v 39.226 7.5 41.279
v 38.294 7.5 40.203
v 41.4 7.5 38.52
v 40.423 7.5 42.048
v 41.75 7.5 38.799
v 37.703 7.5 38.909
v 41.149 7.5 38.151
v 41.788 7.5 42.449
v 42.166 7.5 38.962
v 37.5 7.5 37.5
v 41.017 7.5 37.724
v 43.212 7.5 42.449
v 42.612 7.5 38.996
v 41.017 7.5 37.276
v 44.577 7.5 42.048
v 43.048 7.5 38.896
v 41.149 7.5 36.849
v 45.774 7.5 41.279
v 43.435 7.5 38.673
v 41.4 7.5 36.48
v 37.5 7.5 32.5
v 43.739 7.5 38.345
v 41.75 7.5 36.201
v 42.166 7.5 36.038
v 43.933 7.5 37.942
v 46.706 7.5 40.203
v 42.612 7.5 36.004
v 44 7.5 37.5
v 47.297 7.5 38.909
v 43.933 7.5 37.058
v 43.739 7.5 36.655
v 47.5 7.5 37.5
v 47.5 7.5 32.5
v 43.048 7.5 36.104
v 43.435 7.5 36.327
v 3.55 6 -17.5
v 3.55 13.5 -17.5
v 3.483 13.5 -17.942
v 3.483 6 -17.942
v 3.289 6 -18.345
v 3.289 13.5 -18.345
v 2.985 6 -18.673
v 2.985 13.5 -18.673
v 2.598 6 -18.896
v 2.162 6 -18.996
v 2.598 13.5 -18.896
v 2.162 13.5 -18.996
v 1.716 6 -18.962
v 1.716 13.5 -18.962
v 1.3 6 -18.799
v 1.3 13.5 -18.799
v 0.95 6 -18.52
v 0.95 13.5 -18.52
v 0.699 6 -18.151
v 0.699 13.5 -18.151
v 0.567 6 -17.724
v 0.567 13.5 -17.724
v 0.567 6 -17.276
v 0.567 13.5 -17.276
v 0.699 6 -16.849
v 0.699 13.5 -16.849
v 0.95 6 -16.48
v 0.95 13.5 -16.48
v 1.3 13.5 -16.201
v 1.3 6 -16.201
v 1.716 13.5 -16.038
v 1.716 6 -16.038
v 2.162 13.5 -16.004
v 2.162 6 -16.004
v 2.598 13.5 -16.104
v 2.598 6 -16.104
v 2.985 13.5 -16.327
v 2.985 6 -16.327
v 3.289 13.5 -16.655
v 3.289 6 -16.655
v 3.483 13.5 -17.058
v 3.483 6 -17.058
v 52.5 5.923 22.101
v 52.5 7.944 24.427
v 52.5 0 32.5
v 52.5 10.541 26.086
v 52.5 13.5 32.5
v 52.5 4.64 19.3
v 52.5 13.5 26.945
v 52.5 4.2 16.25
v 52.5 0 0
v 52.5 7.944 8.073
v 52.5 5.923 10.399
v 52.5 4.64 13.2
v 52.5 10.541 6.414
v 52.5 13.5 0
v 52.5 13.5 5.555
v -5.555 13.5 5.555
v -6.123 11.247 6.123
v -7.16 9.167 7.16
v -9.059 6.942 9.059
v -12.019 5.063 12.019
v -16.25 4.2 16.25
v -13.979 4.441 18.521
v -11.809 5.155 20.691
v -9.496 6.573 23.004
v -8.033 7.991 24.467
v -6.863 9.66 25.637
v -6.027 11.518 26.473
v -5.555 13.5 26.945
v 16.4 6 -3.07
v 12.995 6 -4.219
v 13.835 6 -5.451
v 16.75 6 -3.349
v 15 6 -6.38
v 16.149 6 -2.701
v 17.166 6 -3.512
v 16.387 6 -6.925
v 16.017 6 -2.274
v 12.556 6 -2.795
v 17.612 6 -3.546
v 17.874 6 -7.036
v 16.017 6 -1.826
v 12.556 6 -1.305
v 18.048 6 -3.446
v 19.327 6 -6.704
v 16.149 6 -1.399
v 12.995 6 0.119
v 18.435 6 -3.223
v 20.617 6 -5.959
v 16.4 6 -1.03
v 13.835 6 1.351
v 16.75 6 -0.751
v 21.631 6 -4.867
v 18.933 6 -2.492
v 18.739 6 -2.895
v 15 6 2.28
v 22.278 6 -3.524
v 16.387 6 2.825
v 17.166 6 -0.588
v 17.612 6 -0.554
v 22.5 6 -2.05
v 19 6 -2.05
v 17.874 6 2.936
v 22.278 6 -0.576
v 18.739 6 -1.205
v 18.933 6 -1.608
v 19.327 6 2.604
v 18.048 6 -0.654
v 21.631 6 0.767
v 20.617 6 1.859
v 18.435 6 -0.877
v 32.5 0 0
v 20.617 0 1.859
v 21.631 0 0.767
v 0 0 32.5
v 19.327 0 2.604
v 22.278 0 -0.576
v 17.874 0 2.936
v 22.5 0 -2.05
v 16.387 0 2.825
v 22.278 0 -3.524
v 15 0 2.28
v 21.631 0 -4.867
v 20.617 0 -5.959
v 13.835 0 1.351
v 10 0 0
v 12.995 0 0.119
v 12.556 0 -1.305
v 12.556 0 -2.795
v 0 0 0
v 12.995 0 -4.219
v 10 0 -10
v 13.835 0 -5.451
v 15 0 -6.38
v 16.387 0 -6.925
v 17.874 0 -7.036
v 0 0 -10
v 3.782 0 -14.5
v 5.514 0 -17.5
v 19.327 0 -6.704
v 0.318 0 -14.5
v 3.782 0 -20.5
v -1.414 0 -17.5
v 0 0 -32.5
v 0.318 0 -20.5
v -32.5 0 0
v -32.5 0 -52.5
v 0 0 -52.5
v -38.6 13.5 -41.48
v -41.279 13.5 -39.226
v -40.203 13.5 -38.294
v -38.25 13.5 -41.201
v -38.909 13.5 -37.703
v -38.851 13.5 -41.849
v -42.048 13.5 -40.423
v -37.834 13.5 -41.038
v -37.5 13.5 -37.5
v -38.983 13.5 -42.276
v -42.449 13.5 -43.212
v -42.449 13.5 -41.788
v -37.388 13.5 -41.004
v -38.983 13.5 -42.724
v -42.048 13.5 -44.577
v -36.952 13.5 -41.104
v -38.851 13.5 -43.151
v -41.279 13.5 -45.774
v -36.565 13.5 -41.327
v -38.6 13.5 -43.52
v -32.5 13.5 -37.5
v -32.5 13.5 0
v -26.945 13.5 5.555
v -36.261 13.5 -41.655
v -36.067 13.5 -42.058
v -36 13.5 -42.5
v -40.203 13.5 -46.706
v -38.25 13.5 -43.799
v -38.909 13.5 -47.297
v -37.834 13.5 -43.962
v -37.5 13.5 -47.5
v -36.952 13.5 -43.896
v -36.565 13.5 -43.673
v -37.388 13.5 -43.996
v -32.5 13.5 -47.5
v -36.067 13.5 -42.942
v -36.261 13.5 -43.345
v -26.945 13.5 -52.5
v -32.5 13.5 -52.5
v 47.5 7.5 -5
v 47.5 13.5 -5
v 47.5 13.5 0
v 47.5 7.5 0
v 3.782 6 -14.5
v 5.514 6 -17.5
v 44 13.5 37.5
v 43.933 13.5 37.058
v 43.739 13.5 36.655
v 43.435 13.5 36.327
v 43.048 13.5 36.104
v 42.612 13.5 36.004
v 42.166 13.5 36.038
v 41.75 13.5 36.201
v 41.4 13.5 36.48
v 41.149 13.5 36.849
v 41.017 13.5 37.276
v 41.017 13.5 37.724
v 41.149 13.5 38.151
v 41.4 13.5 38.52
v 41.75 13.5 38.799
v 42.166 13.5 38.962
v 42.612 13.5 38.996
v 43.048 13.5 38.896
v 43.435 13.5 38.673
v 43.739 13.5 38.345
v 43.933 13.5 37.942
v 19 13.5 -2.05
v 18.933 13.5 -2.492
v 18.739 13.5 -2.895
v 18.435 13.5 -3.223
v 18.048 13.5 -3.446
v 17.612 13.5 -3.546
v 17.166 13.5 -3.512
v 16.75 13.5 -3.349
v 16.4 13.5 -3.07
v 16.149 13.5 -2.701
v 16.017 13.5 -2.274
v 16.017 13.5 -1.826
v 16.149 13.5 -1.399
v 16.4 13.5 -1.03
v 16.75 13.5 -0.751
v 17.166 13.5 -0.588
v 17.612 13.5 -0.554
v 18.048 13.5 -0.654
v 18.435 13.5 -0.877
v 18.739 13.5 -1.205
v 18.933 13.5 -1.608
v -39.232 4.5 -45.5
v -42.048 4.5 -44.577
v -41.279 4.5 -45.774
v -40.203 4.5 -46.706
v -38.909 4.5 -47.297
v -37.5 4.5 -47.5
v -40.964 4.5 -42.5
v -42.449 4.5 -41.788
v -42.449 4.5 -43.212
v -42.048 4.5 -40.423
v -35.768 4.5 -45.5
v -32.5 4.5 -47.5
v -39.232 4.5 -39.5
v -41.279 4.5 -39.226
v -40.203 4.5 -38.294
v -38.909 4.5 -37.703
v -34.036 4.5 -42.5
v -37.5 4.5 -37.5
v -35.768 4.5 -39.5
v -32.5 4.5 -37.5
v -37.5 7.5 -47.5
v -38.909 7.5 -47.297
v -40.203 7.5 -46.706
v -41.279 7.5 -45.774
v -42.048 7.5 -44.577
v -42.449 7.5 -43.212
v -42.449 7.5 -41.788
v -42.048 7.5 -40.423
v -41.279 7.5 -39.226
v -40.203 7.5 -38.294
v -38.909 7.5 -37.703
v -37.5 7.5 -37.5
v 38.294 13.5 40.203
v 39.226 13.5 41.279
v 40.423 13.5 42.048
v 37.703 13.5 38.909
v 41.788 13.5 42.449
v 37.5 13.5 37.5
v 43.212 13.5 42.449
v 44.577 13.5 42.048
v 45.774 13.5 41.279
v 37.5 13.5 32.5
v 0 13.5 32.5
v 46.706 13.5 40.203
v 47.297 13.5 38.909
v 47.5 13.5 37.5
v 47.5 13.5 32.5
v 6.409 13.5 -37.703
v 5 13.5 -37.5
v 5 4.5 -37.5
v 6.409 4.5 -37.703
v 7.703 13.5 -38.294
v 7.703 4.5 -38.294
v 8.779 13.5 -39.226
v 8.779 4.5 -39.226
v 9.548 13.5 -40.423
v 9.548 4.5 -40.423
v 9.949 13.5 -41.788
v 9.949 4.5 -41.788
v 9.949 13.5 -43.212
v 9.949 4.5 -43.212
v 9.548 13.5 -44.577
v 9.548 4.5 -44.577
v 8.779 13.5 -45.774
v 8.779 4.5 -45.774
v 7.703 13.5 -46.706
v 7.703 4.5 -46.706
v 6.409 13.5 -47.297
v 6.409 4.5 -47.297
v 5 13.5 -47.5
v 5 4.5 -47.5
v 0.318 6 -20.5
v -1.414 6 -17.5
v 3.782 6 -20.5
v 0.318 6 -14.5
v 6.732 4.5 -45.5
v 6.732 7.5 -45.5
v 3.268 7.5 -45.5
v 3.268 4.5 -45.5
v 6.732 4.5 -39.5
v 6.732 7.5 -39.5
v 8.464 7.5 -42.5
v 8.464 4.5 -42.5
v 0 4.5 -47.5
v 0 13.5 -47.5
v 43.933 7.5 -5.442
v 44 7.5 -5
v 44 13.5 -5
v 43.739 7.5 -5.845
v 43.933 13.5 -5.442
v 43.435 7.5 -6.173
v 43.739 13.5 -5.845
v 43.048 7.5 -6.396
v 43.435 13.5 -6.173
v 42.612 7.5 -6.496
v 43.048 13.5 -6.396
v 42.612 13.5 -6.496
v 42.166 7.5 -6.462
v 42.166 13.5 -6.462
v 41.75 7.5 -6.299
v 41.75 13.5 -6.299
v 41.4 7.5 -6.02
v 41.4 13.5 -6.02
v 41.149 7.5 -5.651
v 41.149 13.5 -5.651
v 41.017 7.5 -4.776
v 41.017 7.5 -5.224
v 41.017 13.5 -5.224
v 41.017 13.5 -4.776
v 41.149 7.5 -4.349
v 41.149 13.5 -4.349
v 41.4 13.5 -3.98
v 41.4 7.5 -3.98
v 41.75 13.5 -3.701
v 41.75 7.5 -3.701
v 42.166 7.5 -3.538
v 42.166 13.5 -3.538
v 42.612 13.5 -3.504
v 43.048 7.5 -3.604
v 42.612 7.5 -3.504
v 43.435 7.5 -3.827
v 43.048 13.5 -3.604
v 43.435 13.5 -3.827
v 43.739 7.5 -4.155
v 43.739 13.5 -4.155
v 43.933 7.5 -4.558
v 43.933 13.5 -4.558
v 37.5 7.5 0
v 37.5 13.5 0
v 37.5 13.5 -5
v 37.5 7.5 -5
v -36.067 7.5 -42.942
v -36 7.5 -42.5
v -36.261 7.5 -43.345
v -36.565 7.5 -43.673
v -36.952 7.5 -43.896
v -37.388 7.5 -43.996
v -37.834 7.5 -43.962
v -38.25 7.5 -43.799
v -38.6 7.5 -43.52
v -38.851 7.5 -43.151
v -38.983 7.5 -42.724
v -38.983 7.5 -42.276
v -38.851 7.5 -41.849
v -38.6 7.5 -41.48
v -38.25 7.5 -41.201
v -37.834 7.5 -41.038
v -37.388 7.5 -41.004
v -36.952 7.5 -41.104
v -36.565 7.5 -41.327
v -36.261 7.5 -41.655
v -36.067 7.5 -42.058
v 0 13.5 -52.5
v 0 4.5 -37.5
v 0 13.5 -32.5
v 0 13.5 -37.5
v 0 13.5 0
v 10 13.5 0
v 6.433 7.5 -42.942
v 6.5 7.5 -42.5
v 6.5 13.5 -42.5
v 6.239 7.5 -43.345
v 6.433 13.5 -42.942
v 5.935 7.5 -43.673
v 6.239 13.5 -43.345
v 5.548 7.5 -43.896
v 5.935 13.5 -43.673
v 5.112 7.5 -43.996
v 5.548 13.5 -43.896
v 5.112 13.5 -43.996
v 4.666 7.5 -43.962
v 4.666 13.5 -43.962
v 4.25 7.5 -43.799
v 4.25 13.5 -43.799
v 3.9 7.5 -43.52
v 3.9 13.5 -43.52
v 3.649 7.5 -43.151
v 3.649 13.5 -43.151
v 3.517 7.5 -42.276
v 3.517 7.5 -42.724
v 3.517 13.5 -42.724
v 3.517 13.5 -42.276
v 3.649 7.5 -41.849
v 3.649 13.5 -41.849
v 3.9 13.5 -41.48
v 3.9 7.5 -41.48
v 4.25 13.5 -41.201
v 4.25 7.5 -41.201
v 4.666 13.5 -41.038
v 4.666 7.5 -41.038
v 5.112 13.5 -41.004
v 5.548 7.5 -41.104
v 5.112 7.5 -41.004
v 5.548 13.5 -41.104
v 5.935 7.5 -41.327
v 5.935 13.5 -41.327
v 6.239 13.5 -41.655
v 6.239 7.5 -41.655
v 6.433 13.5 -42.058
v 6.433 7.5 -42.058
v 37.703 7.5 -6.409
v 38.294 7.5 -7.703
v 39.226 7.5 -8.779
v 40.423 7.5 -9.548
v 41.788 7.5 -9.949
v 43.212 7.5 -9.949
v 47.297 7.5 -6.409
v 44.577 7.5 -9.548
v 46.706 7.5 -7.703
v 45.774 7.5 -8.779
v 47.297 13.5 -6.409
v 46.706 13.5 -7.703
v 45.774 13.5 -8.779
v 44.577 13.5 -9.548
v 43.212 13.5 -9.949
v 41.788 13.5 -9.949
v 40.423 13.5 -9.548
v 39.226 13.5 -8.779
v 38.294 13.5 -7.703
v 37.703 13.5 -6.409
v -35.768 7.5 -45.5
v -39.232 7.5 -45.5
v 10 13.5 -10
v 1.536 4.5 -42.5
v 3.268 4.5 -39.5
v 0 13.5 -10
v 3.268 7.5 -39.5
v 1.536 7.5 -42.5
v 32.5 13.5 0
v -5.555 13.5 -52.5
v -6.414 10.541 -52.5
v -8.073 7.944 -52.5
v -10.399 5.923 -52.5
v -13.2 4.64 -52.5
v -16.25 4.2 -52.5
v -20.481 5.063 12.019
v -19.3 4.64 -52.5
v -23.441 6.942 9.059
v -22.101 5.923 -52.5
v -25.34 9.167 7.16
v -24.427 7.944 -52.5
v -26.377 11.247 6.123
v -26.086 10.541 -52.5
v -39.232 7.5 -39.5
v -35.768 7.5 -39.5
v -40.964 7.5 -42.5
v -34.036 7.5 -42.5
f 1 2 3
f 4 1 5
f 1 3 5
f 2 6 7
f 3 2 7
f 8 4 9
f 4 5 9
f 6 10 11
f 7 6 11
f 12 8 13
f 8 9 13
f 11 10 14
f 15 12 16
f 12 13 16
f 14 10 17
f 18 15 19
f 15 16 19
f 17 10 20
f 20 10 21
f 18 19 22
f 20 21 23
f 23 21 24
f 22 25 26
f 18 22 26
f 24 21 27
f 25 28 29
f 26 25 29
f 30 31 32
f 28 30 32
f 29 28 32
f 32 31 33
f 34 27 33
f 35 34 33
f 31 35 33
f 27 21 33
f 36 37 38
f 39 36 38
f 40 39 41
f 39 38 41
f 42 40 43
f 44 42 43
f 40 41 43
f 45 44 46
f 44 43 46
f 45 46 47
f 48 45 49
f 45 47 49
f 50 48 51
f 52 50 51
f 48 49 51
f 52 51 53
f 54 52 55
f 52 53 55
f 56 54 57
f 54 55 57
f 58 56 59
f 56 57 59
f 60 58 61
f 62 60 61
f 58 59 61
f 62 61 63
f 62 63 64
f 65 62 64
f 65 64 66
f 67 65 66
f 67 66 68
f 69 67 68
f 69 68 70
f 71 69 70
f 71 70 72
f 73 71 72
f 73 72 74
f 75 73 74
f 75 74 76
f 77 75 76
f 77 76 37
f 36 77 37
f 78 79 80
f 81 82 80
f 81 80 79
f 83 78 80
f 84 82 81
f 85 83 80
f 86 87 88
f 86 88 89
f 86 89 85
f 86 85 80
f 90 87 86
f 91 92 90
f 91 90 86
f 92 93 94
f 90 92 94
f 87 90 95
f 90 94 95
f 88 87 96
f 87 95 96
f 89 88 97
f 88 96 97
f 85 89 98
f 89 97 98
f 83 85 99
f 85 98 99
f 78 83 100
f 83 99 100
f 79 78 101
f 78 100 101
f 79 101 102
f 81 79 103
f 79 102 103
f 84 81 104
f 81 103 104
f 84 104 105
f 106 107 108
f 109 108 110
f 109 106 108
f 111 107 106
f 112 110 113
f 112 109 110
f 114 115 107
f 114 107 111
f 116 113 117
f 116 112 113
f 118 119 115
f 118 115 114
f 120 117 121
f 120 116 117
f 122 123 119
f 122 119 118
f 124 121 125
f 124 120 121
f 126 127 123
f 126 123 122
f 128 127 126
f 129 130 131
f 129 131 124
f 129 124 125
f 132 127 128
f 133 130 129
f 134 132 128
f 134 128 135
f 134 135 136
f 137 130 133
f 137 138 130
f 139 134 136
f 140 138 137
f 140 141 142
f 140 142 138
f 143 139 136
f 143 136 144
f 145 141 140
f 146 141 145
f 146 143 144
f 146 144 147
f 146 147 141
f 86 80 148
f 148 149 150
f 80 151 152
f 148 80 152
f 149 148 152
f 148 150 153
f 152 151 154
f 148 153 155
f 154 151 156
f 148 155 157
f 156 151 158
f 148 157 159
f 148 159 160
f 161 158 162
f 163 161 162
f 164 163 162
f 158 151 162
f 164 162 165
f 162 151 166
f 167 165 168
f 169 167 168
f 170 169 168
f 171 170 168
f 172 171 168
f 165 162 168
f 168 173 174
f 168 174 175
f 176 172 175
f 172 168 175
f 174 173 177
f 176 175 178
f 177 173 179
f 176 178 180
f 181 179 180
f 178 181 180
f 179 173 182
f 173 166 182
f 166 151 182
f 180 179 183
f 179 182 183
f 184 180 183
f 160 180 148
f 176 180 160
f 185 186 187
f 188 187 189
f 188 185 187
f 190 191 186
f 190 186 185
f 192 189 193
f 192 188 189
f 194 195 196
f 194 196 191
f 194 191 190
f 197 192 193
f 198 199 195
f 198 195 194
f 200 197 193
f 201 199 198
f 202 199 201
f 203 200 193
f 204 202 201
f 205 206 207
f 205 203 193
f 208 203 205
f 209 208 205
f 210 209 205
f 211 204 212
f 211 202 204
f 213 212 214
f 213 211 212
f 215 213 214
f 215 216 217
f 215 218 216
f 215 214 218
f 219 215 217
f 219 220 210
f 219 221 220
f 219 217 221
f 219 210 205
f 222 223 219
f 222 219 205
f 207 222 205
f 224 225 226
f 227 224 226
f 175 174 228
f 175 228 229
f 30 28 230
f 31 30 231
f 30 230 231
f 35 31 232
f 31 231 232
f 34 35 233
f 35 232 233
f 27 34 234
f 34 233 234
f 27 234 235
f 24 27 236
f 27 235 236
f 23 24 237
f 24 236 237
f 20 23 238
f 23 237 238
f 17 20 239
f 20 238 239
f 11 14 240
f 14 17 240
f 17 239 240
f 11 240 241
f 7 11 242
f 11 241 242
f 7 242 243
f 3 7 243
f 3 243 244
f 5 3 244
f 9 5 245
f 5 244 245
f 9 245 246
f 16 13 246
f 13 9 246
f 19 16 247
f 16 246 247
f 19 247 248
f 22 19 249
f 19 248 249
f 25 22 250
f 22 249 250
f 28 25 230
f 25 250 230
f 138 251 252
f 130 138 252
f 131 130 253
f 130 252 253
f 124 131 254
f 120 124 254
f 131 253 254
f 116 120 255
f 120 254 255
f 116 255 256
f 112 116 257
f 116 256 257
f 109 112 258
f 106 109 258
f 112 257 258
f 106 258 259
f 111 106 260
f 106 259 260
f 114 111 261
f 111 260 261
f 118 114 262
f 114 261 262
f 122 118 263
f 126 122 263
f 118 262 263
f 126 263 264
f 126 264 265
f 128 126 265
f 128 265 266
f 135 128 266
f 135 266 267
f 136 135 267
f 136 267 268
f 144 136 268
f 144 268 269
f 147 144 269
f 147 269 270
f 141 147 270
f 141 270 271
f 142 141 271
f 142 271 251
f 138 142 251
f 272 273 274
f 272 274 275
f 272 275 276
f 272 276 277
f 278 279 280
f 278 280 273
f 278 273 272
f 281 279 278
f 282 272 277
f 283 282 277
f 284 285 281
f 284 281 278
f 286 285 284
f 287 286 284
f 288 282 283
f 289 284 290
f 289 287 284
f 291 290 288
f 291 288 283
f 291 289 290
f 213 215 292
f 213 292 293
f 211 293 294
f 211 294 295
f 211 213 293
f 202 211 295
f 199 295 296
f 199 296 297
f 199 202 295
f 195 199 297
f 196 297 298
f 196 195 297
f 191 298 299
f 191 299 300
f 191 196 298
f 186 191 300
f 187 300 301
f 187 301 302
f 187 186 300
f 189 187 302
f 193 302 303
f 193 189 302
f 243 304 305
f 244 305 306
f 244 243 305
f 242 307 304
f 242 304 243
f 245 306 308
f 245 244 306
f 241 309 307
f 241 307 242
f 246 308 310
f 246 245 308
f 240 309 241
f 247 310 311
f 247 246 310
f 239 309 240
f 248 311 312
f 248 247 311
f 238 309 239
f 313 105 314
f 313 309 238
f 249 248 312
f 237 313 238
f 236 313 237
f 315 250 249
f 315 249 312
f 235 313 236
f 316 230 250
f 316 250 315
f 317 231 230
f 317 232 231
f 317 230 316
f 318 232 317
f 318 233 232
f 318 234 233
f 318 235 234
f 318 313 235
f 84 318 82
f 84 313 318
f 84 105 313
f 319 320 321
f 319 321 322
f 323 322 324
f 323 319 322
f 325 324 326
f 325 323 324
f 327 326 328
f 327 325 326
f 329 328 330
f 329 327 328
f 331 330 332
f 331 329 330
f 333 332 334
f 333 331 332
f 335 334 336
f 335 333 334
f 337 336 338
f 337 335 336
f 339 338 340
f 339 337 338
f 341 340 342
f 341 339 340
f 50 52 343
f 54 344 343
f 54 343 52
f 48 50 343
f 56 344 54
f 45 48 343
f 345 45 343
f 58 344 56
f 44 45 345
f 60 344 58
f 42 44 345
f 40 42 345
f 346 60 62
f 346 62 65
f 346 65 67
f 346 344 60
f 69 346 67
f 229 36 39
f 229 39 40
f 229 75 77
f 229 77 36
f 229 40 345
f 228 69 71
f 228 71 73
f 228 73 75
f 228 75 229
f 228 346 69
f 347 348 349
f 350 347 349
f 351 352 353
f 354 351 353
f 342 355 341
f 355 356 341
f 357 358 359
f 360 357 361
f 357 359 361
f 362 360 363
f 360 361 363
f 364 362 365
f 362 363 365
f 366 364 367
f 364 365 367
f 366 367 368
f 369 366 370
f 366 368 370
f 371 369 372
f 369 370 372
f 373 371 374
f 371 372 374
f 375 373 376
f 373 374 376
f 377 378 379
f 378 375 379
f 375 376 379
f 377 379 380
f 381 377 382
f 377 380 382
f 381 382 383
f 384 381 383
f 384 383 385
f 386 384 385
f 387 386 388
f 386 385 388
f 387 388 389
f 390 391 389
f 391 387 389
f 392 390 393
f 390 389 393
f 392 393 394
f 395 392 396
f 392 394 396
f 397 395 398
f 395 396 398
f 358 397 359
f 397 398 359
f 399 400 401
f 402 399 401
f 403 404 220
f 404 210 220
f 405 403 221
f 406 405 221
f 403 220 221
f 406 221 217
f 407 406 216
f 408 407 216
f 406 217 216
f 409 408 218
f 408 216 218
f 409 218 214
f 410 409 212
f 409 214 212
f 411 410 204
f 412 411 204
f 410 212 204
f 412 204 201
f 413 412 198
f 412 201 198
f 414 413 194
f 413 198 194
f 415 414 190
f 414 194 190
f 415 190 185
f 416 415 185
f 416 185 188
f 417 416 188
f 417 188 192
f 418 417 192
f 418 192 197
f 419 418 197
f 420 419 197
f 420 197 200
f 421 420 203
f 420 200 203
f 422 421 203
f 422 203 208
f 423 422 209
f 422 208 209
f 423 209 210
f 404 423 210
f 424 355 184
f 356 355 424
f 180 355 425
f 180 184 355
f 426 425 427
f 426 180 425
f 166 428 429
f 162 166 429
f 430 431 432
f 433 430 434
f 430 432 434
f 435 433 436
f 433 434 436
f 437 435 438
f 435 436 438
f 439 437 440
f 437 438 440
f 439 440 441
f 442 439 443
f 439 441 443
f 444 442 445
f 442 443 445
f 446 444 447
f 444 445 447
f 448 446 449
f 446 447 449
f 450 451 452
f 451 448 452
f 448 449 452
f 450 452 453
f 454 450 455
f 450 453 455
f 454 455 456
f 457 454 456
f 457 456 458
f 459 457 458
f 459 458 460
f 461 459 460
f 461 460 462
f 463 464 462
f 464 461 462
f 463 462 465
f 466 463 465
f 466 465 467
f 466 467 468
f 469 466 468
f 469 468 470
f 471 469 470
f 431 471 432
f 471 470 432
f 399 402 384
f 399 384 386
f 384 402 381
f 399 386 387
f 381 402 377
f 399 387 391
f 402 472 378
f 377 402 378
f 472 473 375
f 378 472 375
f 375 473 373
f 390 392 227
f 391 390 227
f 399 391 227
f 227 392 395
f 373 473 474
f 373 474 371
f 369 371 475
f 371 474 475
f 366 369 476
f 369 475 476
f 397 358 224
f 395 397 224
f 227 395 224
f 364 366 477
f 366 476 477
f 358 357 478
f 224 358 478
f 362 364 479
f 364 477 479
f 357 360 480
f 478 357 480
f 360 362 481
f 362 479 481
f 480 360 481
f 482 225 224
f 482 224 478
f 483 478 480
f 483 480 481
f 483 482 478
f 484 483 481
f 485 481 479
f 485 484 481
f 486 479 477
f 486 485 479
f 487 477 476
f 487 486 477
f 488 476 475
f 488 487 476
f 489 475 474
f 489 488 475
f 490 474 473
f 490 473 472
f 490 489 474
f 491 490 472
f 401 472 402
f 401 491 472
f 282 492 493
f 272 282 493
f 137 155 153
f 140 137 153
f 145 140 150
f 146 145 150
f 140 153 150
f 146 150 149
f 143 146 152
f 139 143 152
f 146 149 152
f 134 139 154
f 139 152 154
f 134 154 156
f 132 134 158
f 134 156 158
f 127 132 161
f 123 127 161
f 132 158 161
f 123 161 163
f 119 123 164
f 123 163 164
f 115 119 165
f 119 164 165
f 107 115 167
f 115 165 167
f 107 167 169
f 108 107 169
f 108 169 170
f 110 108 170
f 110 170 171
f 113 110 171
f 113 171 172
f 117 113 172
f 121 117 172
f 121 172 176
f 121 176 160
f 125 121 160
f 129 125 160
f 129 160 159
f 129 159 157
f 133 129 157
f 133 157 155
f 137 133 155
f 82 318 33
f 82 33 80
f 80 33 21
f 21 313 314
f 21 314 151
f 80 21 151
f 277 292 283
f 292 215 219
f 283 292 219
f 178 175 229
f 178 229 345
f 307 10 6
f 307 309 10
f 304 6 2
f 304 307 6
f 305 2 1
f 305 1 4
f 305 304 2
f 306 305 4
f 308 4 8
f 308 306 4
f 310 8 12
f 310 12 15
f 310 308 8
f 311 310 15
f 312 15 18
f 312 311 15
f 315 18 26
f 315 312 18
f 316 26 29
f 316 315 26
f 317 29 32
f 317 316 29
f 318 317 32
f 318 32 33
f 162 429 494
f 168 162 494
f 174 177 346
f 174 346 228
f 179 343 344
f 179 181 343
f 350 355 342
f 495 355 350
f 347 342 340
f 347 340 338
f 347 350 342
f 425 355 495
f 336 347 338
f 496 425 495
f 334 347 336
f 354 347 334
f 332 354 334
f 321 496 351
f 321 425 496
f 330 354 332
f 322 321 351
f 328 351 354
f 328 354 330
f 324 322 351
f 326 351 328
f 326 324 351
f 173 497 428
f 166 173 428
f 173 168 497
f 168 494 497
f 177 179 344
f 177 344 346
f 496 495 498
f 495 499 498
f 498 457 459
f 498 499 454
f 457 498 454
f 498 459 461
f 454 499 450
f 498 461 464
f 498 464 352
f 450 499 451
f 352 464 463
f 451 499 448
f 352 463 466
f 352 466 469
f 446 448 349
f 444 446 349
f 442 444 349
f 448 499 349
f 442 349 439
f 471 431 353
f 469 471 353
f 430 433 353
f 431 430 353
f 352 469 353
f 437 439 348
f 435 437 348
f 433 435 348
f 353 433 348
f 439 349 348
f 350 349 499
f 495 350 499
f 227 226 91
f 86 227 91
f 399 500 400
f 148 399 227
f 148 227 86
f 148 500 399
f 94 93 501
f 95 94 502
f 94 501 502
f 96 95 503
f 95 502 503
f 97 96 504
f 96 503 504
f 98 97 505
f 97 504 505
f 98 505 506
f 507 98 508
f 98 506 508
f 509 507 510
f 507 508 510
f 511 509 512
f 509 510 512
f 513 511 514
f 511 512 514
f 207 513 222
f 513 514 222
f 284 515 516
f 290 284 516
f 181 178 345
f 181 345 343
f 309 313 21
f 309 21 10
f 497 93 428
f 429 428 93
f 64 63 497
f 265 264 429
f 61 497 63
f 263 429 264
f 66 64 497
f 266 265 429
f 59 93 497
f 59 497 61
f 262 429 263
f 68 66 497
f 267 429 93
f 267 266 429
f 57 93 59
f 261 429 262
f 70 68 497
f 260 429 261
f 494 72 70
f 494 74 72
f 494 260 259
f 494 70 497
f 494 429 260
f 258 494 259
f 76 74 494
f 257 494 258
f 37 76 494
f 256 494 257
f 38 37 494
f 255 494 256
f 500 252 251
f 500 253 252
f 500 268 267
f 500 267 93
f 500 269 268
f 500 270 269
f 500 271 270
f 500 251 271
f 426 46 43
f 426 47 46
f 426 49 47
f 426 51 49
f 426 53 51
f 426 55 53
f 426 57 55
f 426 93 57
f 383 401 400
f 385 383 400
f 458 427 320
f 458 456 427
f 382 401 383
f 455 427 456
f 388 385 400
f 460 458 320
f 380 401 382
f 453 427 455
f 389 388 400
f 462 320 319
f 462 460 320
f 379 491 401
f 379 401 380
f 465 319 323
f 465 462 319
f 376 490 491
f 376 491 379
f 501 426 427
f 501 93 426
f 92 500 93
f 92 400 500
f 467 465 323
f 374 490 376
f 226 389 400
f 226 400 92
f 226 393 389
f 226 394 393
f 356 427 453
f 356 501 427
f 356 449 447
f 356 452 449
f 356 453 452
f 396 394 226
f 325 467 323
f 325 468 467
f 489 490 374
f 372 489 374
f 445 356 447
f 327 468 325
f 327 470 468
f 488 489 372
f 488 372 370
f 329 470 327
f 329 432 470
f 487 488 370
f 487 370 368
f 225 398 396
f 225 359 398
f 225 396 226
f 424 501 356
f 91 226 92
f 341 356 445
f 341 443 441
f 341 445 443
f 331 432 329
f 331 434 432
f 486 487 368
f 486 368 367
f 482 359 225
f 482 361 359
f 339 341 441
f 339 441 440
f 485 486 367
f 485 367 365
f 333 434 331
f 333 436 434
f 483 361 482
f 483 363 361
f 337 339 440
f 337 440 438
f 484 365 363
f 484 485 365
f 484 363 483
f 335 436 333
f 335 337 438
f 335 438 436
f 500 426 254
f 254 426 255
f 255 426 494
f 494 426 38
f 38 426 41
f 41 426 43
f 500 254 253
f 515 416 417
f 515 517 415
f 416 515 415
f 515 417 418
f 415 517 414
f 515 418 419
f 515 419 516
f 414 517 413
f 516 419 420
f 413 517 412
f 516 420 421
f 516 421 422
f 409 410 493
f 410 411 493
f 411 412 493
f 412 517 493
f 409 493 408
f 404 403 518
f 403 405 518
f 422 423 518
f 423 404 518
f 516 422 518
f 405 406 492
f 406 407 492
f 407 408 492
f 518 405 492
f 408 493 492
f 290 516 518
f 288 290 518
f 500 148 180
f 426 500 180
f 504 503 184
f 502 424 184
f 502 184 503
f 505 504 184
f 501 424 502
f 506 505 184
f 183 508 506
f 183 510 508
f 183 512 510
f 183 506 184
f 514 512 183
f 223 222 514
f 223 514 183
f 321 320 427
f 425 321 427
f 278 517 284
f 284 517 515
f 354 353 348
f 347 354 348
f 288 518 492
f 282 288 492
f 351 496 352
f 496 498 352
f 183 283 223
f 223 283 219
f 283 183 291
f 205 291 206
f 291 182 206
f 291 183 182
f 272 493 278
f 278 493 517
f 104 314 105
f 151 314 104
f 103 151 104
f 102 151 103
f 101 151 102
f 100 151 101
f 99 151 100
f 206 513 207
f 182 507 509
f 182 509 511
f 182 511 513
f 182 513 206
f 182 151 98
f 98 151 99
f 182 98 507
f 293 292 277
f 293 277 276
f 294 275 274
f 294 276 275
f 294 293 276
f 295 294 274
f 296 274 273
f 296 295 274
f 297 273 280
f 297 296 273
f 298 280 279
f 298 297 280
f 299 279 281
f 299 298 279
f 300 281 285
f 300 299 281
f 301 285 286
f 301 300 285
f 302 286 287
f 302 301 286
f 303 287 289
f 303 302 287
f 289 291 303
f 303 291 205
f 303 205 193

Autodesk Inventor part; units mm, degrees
ref_plane "YZ Plane" through (0, 0, 0) normal (1, 0, 0) x (0, 1, 0)
ref_plane "XZ Plane" through (0, 0, 0) normal (0, 1, 0) x (-1, 0, 0)
sketch "Sketch1" plane through (0, 0, 0) normal (0, 1, 0) x (-1, 0, 0)
  line L0 (-32.5, -32.5) -> (32.5, -32.5)
  line L1 (32.5, -32.5) -> (32.5, 32.5)
  line L2 (32.5, 32.5) -> (-32.5, 32.5)
  line L3 (-32.5, 32.5) -> (-32.5, -32.5)
  line L4 (-32.5, -32.5) -> (32.5, 32.5) construction
  line L5 (32.5, -32.5) -> (-32.5, 32.5) construction
  line L6 (-32.5, 0) -> (0, -32.5)
  point P0 (0, 0)
  dimension "d0" = 65
  dimension "d1" = 65
extrude "Extrusion1" add sketch "Sketch1" along normal blind 30 contours L6 L3 L2 L1 L0
sketch "Sketch2" plane through (32.5, 0, 32.5) normal (1, 0, 0) x (0, 0, -1)
  line L0 (0, 0) -> (32.5, 0) projected
  line L1 (0, 30) -> (32.5, 30) projected
  line L2 (0, 0) -> (32.5, 30)
  circle A0 centre (16.25, 15) radius 10.8
  dimension "d5" = 21.6
extrude "Extrusion2" cut sketch "Sketch2" against normal blind 65.75
sketch "Sketch3" plane through (0, 0, -32.5) normal (0, 0, -1) x (-1, 0, 0)
  line L0 (32.5, 0) -> (32.5, 30) projected
  line L1 (0, 0) -> (32.5, 30)
  circle A0 centre (16.25, 15) radius 10.8
  dimension "d8" = 21.6
extrude "Extrusion3" cut sketch "Sketch3" against normal blind 65.75
sketch "Sketch4" plane through (0, 0, -32.5) normal (0, 0, -1) x (-1, 0, 0)
  circle A0 centre (16.25, 15) radius 10.8 projected
  line L0 (0, 0) -> (32.5, 0) projected
  line L1 (32.5, 0) -> (32.5, 30) projected
  line L2 (0, 30) -> (32.5, 30) projected
  line L3 (0, 0) -> (0, 30) projected
  point P0 (0, 0)
extrude "Extrusion4" add sketch "Sketch4" along normal blind 20
sketch "Sketch6" plane through (-32.5, 0, 32.5) normal (0, 0, 1) x (1, 0, 0)
  point P0 (32.5, 0)
ref_plane "Work Plane1" through (-32.5, 0, 32.5) normal (0.7071, 0, 0.7071) x (0, 1, 0)
mirror "Mirror1" about plane through (-32.5, 0, 32.5) normal (0.7071, 0, 0.7071) of "Extrusion4"
sketch "Sketch7" plane through (0, 30, 0) normal (0, 1, 0) x (1, 0, 0)
  line L0 (0, 0) -> (10, 0)
  line L1 (10, 0) -> (10, 10)
  line L2 (10, 10) -> (0, 10)
  line L3 (0, 10) -> (0, 0)
  dimension "d20" = 10
  dimension "d21" = 10
extrude "Extrusion7" cut sketch "Sketch7" against normal blind 72
sketch "Sketch8" plane through (0, 30, 0) normal (0, 1, 0) x (1, 0, 0)
  point P0 (0, 0)
sketch "Sketch9" plane through (0, 0, 0) normal (0, -1, 0) x (1, 0, 0)
  line L0 (-32.5, 32.5) -> (52.5, 32.5) projected
  line L1 (0, 32.5) -> (-32.5, 0)
  line L2 (-32.5, 32.5) -> (-32.5, -52.5) projected
  line L3 (-16.25, 16.25) -> (-27.05, 27.05) projected
  line L4 (10, -10) -> (0, -10) projected
  line L5 (0, -10) -> (0, 0) projected
  line L6 (0, 0) -> (10, 0) projected
  line L7 (10, 0) -> (10, -10) projected
  line L8 (-32.5, 32.5) -> (52.5, 32.5) projected
  line L9 (-32.5, 32.5) -> (-32.5, -52.5) projected
  line L10 (0, -52.5) -> (-32.5, -52.5) projected
  line L11 (0, -32.5) -> (0, -52.5) projected
  line L12 (32.5, 0) -> (0, -32.5) projected
  line L13 (32.5, 0) -> (52.5, 0) projected
  line L14 (52.5, 0) -> (52.5, 32.5) projected
extrude "Extrusion8" cut sketch "Sketch9" against normal blind 77 contours L0 L1 L2
sketch "Sketch10" plane through (52.5, 0, 0) normal (1, 0, 0) x (0, 0, -1)
  line L0 (-32.5, 0) -> (-32.5, 30) projected
  line L1 (-32.5, 15) -> (70.7005, 15)
  line L2 (-32.5, 18) -> (63.4302, 18)
  line L3 (63.4302, 18) -> (63.4302, 33.0459)
  line L4 (63.4302, 33.0459) -> (-32.5, 33.0459)
  line L5 (-32.5, 33.0459) -> (-32.5, 18)
  line L6 (-32.5, 12) -> (64.9451, 12)
  line L7 (64.9451, 12) -> (64.9451, -20.31)
  line L8 (64.9451, -20.31) -> (-32.5, -20.31)
  line L9 (-32.5, -20.31) -> (-32.5, 12)
  line L10 (32.5, 0) -> (52.5, 0) projected
  line L11 (-32.5, 30) -> (52.5, 30)
  line L12 (52.5, 30) -> (52.5, 0)
  line L13 (52.5, 0) -> (-32.5, 0)
  line L14 (-32.5, 0) -> (-32.5, 30)
  point P0 (0, 0)
  point P1 (52.5, 15)
  dimension "d26" = 3
  dimension "d27" = 3
extrude "Extrusion9" cut sketch "Sketch10" against normal blind 103.25 contours L0 L2 L12 L1 | L0 L11 L12 L2
sketch "Sketch11" plane through (52.5, 15, 5.45) normal (0, 1, 0) x (1, 0, 0)
  line L0 (-85, 5.45) -> (-85, 57.95) projected
  line L1 (-85, 47.95) -> (-90, 47.95)
  circle A0 centre (-90, 47.95) radius 1.5
  circle A1 centre (-90, 47.95) radius 5
  line L2 (-90, 52.95) -> (-85, 52.95)
  line L3 (-85, 52.95) -> (-85, 42.95)
  line L4 (-85, 42.95) -> (-90, 42.95)
  line L5 (-90, 42.95) -> (-90, 52.95)
  line L6 (-52.5, 57.95) -> (-85, 57.95) projected
  line L7 (-68.75, 57.95) -> (-68.75, 39.1834)
  line L8 (-68.75, -10.8) -> (-79.55, 0) projected
  line L9 (-68.75, -10.8) -> (-16.5653, 41.3847)
  line L10 (-52.5, 47.95) -> (-47.5, 47.95)
  circle A2 centre (-47.5, 47.95) radius 1.5
  circle A3 centre (-47.5, 47.95) radius 5
  line L11 (-47.5, 52.95) -> (-52.5, 52.95)
  line L12 (-52.5, 52.95) -> (-52.5, 42.95)
  line L13 (-52.5, 42.95) -> (-47.5, 42.95)
  line L14 (-47.5, 42.95) -> (-47.5, 52.95)
  line L15 (-10, -27.05) -> (-10, -32.05)
  circle A4 centre (-10, -32.05) radius 1.5
  circle A5 centre (-10, -32.05) radius 5
  line L16 (-5, -32.05) -> (-5, -27.05)
  line L17 (-5, -27.05) -> (-15, -27.05)
  line L18 (-15, -27.05) -> (-15, -32.05)
  line L19 (-15, -32.05) -> (-5, -32.05)
  line L20 (0, 5.45) -> (0, -27.05)
  line L21 (0, -10.8) -> (-18.7666, -10.8)
  line L22 (-10, 5.45) -> (-10, 10.45)
  circle A6 centre (-10, 10.45) radius 1.5
  circle A7 centre (-10, 10.45) radius 5
  line L23 (-5, 10.45) -> (-5, 5.45)
  line L24 (-5, 5.45) -> (-15, 5.45)
  line L25 (-15, 5.45) -> (-15, 10.45)
  line L26 (-15, 10.45) -> (-5, 10.45)
  point P0 (-52.5, 5.45)
  point P1 (-15, -32.05)
  point P2 (-85, 52.95)
  dimension "d30" = 5
  dimension "d31" = 3
  dimension "d32" = 10
extrude "Extrusion10" add sketch "Sketch11" against normal blind 7.5 contours L4 A1 L0 | A1 L2 L0 | A1 L5 A0 L1 | L1 A0 L5 A1 | A1 L5 A0 | A3 L14 A2 L10 | L12 L11 A3 | L10 A2 L14 A3 | A3 L13 L12 | A3 L14 A2 | A5 L19 A4 L15 | L17 L16 A5 | L15 A4 L19 A5 | A5 L18 L17 | A5 L19 A4 | A7 L26 A6 L22 | L24 L25 A7 | L22 A6 L26 A7 | A7 L23 L24 | A7 L26 A6
sketch "Sketch12" plane through (52.5, 15, 5.45) normal (0, 1, 0) x (1, 0, 0)
  line L0 (0, 0) -> (-57.95, 0) projected
  line L1 (-57.95, 0) -> (-36.25, 21.7)
  line L2 (-52.5, 37.95) -> (-20, 5.45) projected
  circle A0 centre (-50.45, 22.95) radius 1.5
  line L3 (-57.95, 0) -> (-57.95, 57.95) projected
  line L4 (-42.5, 15.45) -> (-52.5, 15.45) projected
  circle A1 centre (-35, 7.5) radius 1.5
  point P0 (-52.5, 5.45)
  dimension "d35" = 7.5
  dimension "d36" = 7.5
  dimension "d37" = 3
extrude "Extrusion11" cut sketch "Sketch12" against normal blind 19
sketch "Sketch13" plane through (52.5, 7.5, 5.45) normal (0, -1, 0) x (1, 0, 0)
  circle A0 centre (-90, -47.95) radius 1.5 projected
  line L0 (-93.4641, -47.95) -> (-91.7321, -44.95)
  line L1 (-91.7321, -44.95) -> (-88.2679, -44.95)
  line L2 (-88.2679, -44.95) -> (-86.5359, -47.95)
  line L3 (-86.5359, -47.95) -> (-88.2679, -50.95)
  line L4 (-88.2679, -50.95) -> (-91.7321, -50.95)
  line L5 (-91.7321, -50.95) -> (-93.4641, -47.95)
  line L6 (-85, -42.95) -> (-90, -42.95) projected
  arc A1 (-90, -42.95) -> (-90, -52.95) centre (-90, -47.95) ccw projected
  line L7 (-90, -52.95) -> (-85, -52.95) projected
  line L8 (-85, -42.95) -> (-85, -52.95) projected
  circle A2 centre (-90, -47.95) radius 1.5 projected
  point P0 (-52.5, -5.45)
  dimension "d40" = 6
extrude "Extrusion12" add sketch "Sketch13" along normal blind 3 contours L8 L7 A1 L6
sketch "Sketch14" plane through (52.5, 7.5, 5.45) normal (0, -1, 0) x (1, 0, 0)
  circle A0 centre (-47.5, -47.95) radius 1.5 projected
  line L0 (-50.9641, -47.95) -> (-49.2321, -44.95)
  line L1 (-49.2321, -44.95) -> (-45.7679, -44.95)
  line L2 (-45.7679, -44.95) -> (-44.0359, -47.95)
  line L3 (-44.0359, -47.95) -> (-45.7679, -50.95)
  line L4 (-45.7679, -50.95) -> (-49.2321, -50.95)
  line L5 (-49.2321, -50.95) -> (-50.9641, -47.95)
  line L6 (-47.5, -42.95) -> (-52.5, -42.95) projected
  line L7 (-52.5, -52.95) -> (-52.5, -42.95) projected
  line L8 (-52.5, -52.95) -> (-47.5, -52.95) projected
  arc A1 (-47.5, -52.95) -> (-47.5, -42.95) centre (-47.5, -47.95) ccw projected
  circle A2 centre (-47.5, -47.95) radius 1.5 projected
  point P0 (-52.5, -5.45)
  dimension "d43" = 6
extrude "Extrusion13" add sketch "Sketch14" along normal blind 3 contours A1 L8 L7 L6
sketch "Sketch15" plane through (0, 0, 0) normal (0, -1, 0) x (1, 0, 0)
  circle A0 centre (2.05, -17.5) radius 1.5 projected
  line L0 (-1.4141, -17.5) -> (0.3179, -14.5)
  line L1 (0.3179, -14.5) -> (3.7821, -14.5)
  line L2 (3.7821, -14.5) -> (5.5141, -17.5)
  line L3 (5.5141, -17.5) -> (3.7821, -20.5)
  line L4 (3.7821, -20.5) -> (0.3179, -20.5)
  line L5 (0.3179, -20.5) -> (-1.4141, -17.5)
  circle A1 centre (17.5, -2.05) radius 1.5 projected
  circle A2 centre (17.5, -2.05) radius 5
  point P0 (0, 0)
  dimension "d46" = 6
  dimension "d47" = 10
extrude "Extrusion14" cut sketch "Sketch15" against normal blind 6 contours A0 | L0 L1 L2 L3 L4 L5 | A1 | A2
sketch "Sketch16" plane through (52.5, 15, 5.45) normal (0, 1, 0) x (1, 0, 0)
  circle A0 centre (-50.45, 22.95) radius 1.5 projected
  circle A1 centre (-35, 7.5) radius 1.5 projected
  circle A2 centre (-50.45, 22.95) radius 1.5 projected
  circle A3 centre (-10, 10.45) radius 1.5 projected
  circle A4 centre (-47.5, 47.95) radius 1.5 projected
  line L0 (-57.95, 0) -> (-57.95, 57.95) projected
  line L1 (0, 0) -> (-57.95, 0) projected
  line L2 (0, 5.45) -> (0, 0) projected
  line L3 (-5, 5.45) -> (0, 5.45) projected
  line L4 (-5, 5.45) -> (-5, 10.45) projected
  arc A5 (-5, 10.45) -> (-15, 10.45) centre (-10, 10.45) ccw projected
  line L5 (-15, 10.45) -> (-15, 5.45) projected
  line L6 (-20, 5.45) -> (-15, 5.45) projected
  line L7 (-52.5, 37.95) -> (-20, 5.45) projected
  line L8 (-52.5, 42.95) -> (-52.5, 37.95) projected
  line L9 (-52.5, 42.95) -> (-47.5, 42.95) projected
  arc A6 (-47.5, 42.95) -> (-47.5, 52.95) centre (-47.5, 47.95) ccw projected
  line L10 (-47.5, 52.95) -> (-52.5, 52.95) projected
  line L11 (-52.5, 57.95) -> (-52.5, 52.95) projected
  line L12 (-57.95, 57.95) -> (-52.5, 57.95) projected
  line L13 (-52.5, 5.45) -> (-42.5, 5.45) projected
  line L14 (-52.5, 15.45) -> (-52.5, 5.45) projected
  line L15 (-42.5, 15.45) -> (-52.5, 15.45) projected
  line L16 (-42.5, 5.45) -> (-42.5, 15.45) projected
  circle A7 centre (-90, 47.95) radius 1.5 projected
  line L17 (-79.55, 57.95) -> (-79.55, 0) projected
  line L18 (-85, 57.95) -> (-79.55, 57.95) projected
  line L19 (-85, 52.95) -> (-85, 57.95) projected
  line L20 (-85, 52.95) -> (-90, 52.95) projected
  arc A8 (-90, 52.95) -> (-90, 42.95) centre (-90, 47.95) ccw projected
  line L21 (-90, 42.95) -> (-85, 42.95) projected
  line L22 (-85, 5.45) -> (-85, 42.95) projected
  line L23 (-79.55, 0) -> (-85, 5.45) projected
  circle A9 centre (-10, -32.05) radius 1.5 projected
  line L24 (-57.95, -21.6) -> (0, -21.6) projected
  line L25 (-52.5, -27.05) -> (-57.95, -21.6) projected
  line L26 (-15, -27.05) -> (-52.5, -27.05) projected
  line L27 (-15, -27.05) -> (-15, -32.05) projected
  arc A10 (-15, -32.05) -> (-5, -32.05) centre (-10, -32.05) ccw projected
  line L28 (-5, -32.05) -> (-5, -27.05) projected
  line L29 (0, -27.05) -> (-5, -27.05) projected
  line L30 (0, -21.6) -> (0, -27.05) projected
  circle A11 centre (-52.5, 5.45) radius 98.2361
  point P0 (-52.5, 5.45)
extrude "Extrusion15" cut sketch "Sketch16" against normal blind 1.5 contours A0 | A1 | A3 | A4 | L0 L12 L11 L10 A6 L9 L8 L7 L6 L5 A5 L4 L3 L2 L1 | L14 L15 L16 L13 | A7 | L17 L23 L22 L21 A8 L20 L19 L18 | A9 | L24 L30 L29 L28 A10 L27 L26 L25 | A11
properties part number "Shaft_Connector_Top_Corner"
